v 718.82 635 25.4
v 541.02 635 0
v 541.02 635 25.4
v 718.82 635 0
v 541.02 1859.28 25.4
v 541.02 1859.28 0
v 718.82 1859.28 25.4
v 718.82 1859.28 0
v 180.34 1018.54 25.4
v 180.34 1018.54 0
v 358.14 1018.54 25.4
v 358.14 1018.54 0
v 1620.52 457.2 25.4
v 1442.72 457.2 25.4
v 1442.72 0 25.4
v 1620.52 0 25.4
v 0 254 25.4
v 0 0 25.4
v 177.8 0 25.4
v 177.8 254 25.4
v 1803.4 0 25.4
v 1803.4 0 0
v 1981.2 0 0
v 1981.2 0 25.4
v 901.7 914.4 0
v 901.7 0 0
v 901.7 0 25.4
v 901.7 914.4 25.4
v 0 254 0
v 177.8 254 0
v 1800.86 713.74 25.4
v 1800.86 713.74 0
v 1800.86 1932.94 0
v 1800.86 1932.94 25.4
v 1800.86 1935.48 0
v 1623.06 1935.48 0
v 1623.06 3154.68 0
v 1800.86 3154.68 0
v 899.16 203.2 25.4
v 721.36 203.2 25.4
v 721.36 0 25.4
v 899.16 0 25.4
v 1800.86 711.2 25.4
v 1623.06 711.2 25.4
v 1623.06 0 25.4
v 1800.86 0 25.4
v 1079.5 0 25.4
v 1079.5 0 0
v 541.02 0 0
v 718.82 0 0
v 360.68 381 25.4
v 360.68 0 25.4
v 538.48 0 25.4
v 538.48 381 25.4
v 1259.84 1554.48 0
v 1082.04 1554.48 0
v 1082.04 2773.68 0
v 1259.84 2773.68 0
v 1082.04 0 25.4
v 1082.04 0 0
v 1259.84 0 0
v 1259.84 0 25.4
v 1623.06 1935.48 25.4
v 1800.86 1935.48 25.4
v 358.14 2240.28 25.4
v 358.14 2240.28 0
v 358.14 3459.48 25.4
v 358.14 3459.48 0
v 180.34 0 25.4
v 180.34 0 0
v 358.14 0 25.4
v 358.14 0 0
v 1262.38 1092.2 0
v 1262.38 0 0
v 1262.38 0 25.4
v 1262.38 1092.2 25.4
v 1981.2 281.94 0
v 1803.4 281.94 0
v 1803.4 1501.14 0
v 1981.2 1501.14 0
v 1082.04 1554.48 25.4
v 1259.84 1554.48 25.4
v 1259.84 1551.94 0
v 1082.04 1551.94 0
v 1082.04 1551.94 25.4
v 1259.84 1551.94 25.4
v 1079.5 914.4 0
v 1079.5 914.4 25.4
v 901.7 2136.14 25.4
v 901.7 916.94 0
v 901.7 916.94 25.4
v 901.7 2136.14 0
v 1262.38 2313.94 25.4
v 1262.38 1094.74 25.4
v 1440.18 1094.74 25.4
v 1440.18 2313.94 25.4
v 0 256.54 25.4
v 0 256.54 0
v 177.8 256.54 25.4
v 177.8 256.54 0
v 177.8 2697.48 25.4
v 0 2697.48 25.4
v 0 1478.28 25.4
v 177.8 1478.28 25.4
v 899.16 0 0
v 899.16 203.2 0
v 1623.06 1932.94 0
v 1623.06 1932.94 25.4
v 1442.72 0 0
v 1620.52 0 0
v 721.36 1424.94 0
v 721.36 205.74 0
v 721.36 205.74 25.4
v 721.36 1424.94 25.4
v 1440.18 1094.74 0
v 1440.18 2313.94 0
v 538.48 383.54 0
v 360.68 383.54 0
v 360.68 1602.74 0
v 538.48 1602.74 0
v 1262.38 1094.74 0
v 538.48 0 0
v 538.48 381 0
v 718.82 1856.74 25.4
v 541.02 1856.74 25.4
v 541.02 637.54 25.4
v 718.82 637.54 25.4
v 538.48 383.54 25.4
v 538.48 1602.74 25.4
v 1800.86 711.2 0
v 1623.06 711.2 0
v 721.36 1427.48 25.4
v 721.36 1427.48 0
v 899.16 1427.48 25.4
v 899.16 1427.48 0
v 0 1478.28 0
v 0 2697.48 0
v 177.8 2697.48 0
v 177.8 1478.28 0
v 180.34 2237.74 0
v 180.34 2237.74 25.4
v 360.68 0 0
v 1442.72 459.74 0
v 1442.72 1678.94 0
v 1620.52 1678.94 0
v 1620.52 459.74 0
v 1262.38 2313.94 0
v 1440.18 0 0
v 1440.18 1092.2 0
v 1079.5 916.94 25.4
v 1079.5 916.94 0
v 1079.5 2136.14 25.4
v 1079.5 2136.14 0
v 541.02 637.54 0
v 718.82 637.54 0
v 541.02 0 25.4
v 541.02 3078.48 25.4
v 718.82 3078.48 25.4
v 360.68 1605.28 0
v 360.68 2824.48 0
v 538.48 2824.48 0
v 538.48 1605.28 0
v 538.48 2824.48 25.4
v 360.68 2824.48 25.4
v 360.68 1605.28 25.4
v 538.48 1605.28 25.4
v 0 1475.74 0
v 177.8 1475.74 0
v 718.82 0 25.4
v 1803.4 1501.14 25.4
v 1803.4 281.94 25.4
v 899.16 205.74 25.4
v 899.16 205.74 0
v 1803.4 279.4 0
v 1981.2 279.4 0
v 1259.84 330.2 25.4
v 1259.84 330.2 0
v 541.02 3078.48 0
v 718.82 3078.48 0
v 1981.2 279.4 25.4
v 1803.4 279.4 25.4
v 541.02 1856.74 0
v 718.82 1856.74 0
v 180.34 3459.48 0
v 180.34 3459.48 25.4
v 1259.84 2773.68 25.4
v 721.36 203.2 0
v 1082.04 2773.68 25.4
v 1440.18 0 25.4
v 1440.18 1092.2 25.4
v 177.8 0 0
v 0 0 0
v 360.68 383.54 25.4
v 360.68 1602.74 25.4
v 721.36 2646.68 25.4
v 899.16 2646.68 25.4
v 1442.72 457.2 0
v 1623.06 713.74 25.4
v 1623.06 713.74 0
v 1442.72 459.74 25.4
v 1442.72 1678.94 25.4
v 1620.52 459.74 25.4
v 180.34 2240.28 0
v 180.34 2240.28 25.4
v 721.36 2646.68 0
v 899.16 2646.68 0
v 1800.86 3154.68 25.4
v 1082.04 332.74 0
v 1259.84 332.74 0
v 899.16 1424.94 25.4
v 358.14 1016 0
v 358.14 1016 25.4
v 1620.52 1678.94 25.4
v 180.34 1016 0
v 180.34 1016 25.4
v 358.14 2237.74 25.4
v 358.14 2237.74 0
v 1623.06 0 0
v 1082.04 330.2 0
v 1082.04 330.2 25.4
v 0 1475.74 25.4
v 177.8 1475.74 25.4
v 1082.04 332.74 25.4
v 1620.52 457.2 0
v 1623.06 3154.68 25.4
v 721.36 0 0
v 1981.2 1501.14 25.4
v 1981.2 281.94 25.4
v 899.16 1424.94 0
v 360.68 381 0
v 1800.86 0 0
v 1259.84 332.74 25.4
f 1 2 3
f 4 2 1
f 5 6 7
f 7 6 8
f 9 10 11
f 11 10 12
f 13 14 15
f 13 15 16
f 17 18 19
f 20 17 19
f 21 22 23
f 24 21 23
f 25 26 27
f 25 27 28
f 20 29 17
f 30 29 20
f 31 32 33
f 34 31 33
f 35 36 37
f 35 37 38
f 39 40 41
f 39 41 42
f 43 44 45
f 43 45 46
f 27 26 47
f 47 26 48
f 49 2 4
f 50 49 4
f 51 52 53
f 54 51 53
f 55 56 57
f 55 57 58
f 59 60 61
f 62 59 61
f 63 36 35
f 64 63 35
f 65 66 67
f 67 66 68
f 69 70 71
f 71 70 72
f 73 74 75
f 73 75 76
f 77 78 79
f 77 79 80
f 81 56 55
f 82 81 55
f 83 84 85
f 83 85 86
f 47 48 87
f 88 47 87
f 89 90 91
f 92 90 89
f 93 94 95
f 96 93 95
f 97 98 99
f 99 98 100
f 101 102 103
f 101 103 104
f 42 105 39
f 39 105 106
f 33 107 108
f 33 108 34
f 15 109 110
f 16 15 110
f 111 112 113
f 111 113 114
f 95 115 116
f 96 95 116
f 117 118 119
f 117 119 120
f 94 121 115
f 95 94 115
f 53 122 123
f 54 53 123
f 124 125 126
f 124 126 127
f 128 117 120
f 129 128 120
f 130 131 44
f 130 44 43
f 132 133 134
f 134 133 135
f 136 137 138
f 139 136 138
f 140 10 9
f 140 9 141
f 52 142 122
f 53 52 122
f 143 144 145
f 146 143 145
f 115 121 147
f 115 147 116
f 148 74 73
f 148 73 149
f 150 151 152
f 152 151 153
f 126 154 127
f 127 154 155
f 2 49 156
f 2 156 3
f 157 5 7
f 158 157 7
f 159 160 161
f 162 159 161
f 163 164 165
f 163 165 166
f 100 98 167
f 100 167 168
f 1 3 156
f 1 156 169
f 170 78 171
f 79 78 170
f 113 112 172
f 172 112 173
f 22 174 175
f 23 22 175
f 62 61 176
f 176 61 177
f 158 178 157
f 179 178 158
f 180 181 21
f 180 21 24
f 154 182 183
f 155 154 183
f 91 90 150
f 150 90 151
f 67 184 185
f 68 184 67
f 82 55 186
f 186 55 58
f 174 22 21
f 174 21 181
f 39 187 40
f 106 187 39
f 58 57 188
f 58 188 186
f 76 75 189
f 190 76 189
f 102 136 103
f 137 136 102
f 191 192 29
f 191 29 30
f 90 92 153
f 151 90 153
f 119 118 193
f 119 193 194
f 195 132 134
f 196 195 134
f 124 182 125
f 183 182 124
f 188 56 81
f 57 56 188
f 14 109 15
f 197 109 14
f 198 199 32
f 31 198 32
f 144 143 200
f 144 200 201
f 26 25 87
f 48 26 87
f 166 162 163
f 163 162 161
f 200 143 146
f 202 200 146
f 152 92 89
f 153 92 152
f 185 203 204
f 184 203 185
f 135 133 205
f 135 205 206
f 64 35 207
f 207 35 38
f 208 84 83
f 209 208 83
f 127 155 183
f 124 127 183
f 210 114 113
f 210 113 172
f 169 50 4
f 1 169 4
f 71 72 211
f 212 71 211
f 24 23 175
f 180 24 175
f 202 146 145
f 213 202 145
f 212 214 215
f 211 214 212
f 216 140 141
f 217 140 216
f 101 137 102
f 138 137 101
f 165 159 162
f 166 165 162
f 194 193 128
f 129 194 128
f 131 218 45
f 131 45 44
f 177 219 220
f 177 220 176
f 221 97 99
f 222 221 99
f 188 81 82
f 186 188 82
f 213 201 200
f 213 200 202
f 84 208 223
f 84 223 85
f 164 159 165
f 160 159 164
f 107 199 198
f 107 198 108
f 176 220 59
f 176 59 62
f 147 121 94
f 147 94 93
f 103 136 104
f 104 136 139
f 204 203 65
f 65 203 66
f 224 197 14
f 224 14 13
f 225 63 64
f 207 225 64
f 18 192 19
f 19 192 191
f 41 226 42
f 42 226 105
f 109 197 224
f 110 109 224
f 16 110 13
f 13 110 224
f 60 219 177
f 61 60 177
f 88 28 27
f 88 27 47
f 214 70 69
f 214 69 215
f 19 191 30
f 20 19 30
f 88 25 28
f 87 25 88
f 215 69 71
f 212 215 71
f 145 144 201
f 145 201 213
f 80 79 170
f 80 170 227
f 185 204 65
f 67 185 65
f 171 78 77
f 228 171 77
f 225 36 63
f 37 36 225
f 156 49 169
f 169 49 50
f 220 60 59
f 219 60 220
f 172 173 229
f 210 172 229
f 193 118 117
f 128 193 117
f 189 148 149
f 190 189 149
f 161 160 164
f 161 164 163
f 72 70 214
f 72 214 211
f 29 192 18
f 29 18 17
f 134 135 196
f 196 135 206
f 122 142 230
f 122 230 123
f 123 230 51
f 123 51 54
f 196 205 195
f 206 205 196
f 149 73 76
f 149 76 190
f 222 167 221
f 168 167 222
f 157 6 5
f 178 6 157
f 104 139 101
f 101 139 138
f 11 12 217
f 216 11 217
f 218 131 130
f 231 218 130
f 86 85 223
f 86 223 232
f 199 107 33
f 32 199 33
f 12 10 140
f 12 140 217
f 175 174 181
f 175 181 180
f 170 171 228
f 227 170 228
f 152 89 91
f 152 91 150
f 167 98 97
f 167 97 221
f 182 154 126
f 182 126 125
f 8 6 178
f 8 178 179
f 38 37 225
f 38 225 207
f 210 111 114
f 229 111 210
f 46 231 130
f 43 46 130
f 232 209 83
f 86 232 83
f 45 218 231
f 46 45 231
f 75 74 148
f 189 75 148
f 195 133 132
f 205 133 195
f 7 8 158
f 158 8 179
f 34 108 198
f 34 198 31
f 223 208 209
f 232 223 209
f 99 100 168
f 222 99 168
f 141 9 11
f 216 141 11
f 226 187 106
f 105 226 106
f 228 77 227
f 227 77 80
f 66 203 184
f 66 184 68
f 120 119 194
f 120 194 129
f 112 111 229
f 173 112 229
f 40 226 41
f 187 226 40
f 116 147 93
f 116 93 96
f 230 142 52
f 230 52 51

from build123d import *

# Parameters (mm, degrees)
F0_W     = 177.8
F0_H     = 254
F0_H_2   = 1016
F0_H_3   = 381
F0_H_4   = 635
F0_H_5   = 203.2
F0_H_6   = 1219.2
F0_H_7   = 914.4
F0_H_8   = 330.2
F0_H_9   = 1092.2
F0_H_10  = 457.2
F0_H_11  = 711.2
F0_H_12  = 279.4
F1_DEPTH = 25.4


with BuildPart() as f1:
    # F0 (on Top) → F1 (new body)
    with BuildSketch(Plane.XY):
        with Locations((88.9, 127)):
            Rectangle(F0_W, F0_H)
        with Locations((269.24, 508)):
            Rectangle(F0_W, F0_H_2)
        with Locations((449.58, 190.5)):
            Rectangle(F0_W, F0_H_3)
        with Locations((629.92, 317.5)):
            Rectangle(F0_W, F0_H_4)
        with Locations((810.26, 101.6)):
            Rectangle(F0_W, F0_H_5)
        with Locations((88.9, 866.14)):
            Rectangle(F0_W, F0_H_6)
        with Locations((269.24, 1628.14)):
            Rectangle(F0_W, F0_H_6)
        with Locations((449.58, 993.14)):
            Rectangle(F0_W, F0_H_6)
        with Locations((629.92, 1247.14)):
            Rectangle(F0_W, F0_H_6)
        with Locations((810.26, 815.34)):
            Rectangle(F0_W, F0_H_6)
        with Locations((88.9, 2087.88)):
            Rectangle(F0_W, F0_H_6)
        with Locations((269.24, 2849.88)):
            Rectangle(F0_W, F0_H_6)
        with Locations((449.58, 2214.88)):
            Rectangle(F0_W, F0_H_6)
        with Locations((629.92, 2468.88)):
            Rectangle(F0_W, F0_H_6)
        with Locations((810.26, 2037.08)):
            Rectangle(F0_W, F0_H_6)
        with Locations((990.6, 457.2)):
            Rectangle(F0_W, F0_H_7)
        with Locations((990.6, 1526.54)):
            Rectangle(F0_W, F0_H_6)
        with Locations((1170.94, 165.1)):
            Rectangle(F0_W, F0_H_8)
        with Locations((1351.28, 546.1)):
            Rectangle(F0_W, F0_H_9)
        with Locations((1170.94, 942.34)):
            Rectangle(F0_W, F0_H_6)
        with Locations((1531.62, 228.6)):
            Rectangle(F0_W, F0_H_10)
        with Locations((1711.96, 355.6)):
            Rectangle(F0_W, F0_H_11)
        with Locations((1531.62, 1069.34)):
            Rectangle(F0_W, F0_H_6)
        with Locations((1711.96, 1323.34)):
            Rectangle(F0_W, F0_H_6)
        with Locations((1170.94, 2164.08)):
            Rectangle(F0_W, F0_H_6)
        with Locations((1351.28, 1704.34)):
            Rectangle(F0_W, F0_H_6)
        with Locations((1711.96, 2545.08)):
            Rectangle(F0_W, F0_H_6)
        with Locations((1892.3, 139.7)):
            Rectangle(F0_W, F0_H_12)
        with Locations((1892.3, 891.54)):
            Rectangle(F0_W, F0_H_6)
    extrude(amount=F1_DEPTH)


solid = f1.part
